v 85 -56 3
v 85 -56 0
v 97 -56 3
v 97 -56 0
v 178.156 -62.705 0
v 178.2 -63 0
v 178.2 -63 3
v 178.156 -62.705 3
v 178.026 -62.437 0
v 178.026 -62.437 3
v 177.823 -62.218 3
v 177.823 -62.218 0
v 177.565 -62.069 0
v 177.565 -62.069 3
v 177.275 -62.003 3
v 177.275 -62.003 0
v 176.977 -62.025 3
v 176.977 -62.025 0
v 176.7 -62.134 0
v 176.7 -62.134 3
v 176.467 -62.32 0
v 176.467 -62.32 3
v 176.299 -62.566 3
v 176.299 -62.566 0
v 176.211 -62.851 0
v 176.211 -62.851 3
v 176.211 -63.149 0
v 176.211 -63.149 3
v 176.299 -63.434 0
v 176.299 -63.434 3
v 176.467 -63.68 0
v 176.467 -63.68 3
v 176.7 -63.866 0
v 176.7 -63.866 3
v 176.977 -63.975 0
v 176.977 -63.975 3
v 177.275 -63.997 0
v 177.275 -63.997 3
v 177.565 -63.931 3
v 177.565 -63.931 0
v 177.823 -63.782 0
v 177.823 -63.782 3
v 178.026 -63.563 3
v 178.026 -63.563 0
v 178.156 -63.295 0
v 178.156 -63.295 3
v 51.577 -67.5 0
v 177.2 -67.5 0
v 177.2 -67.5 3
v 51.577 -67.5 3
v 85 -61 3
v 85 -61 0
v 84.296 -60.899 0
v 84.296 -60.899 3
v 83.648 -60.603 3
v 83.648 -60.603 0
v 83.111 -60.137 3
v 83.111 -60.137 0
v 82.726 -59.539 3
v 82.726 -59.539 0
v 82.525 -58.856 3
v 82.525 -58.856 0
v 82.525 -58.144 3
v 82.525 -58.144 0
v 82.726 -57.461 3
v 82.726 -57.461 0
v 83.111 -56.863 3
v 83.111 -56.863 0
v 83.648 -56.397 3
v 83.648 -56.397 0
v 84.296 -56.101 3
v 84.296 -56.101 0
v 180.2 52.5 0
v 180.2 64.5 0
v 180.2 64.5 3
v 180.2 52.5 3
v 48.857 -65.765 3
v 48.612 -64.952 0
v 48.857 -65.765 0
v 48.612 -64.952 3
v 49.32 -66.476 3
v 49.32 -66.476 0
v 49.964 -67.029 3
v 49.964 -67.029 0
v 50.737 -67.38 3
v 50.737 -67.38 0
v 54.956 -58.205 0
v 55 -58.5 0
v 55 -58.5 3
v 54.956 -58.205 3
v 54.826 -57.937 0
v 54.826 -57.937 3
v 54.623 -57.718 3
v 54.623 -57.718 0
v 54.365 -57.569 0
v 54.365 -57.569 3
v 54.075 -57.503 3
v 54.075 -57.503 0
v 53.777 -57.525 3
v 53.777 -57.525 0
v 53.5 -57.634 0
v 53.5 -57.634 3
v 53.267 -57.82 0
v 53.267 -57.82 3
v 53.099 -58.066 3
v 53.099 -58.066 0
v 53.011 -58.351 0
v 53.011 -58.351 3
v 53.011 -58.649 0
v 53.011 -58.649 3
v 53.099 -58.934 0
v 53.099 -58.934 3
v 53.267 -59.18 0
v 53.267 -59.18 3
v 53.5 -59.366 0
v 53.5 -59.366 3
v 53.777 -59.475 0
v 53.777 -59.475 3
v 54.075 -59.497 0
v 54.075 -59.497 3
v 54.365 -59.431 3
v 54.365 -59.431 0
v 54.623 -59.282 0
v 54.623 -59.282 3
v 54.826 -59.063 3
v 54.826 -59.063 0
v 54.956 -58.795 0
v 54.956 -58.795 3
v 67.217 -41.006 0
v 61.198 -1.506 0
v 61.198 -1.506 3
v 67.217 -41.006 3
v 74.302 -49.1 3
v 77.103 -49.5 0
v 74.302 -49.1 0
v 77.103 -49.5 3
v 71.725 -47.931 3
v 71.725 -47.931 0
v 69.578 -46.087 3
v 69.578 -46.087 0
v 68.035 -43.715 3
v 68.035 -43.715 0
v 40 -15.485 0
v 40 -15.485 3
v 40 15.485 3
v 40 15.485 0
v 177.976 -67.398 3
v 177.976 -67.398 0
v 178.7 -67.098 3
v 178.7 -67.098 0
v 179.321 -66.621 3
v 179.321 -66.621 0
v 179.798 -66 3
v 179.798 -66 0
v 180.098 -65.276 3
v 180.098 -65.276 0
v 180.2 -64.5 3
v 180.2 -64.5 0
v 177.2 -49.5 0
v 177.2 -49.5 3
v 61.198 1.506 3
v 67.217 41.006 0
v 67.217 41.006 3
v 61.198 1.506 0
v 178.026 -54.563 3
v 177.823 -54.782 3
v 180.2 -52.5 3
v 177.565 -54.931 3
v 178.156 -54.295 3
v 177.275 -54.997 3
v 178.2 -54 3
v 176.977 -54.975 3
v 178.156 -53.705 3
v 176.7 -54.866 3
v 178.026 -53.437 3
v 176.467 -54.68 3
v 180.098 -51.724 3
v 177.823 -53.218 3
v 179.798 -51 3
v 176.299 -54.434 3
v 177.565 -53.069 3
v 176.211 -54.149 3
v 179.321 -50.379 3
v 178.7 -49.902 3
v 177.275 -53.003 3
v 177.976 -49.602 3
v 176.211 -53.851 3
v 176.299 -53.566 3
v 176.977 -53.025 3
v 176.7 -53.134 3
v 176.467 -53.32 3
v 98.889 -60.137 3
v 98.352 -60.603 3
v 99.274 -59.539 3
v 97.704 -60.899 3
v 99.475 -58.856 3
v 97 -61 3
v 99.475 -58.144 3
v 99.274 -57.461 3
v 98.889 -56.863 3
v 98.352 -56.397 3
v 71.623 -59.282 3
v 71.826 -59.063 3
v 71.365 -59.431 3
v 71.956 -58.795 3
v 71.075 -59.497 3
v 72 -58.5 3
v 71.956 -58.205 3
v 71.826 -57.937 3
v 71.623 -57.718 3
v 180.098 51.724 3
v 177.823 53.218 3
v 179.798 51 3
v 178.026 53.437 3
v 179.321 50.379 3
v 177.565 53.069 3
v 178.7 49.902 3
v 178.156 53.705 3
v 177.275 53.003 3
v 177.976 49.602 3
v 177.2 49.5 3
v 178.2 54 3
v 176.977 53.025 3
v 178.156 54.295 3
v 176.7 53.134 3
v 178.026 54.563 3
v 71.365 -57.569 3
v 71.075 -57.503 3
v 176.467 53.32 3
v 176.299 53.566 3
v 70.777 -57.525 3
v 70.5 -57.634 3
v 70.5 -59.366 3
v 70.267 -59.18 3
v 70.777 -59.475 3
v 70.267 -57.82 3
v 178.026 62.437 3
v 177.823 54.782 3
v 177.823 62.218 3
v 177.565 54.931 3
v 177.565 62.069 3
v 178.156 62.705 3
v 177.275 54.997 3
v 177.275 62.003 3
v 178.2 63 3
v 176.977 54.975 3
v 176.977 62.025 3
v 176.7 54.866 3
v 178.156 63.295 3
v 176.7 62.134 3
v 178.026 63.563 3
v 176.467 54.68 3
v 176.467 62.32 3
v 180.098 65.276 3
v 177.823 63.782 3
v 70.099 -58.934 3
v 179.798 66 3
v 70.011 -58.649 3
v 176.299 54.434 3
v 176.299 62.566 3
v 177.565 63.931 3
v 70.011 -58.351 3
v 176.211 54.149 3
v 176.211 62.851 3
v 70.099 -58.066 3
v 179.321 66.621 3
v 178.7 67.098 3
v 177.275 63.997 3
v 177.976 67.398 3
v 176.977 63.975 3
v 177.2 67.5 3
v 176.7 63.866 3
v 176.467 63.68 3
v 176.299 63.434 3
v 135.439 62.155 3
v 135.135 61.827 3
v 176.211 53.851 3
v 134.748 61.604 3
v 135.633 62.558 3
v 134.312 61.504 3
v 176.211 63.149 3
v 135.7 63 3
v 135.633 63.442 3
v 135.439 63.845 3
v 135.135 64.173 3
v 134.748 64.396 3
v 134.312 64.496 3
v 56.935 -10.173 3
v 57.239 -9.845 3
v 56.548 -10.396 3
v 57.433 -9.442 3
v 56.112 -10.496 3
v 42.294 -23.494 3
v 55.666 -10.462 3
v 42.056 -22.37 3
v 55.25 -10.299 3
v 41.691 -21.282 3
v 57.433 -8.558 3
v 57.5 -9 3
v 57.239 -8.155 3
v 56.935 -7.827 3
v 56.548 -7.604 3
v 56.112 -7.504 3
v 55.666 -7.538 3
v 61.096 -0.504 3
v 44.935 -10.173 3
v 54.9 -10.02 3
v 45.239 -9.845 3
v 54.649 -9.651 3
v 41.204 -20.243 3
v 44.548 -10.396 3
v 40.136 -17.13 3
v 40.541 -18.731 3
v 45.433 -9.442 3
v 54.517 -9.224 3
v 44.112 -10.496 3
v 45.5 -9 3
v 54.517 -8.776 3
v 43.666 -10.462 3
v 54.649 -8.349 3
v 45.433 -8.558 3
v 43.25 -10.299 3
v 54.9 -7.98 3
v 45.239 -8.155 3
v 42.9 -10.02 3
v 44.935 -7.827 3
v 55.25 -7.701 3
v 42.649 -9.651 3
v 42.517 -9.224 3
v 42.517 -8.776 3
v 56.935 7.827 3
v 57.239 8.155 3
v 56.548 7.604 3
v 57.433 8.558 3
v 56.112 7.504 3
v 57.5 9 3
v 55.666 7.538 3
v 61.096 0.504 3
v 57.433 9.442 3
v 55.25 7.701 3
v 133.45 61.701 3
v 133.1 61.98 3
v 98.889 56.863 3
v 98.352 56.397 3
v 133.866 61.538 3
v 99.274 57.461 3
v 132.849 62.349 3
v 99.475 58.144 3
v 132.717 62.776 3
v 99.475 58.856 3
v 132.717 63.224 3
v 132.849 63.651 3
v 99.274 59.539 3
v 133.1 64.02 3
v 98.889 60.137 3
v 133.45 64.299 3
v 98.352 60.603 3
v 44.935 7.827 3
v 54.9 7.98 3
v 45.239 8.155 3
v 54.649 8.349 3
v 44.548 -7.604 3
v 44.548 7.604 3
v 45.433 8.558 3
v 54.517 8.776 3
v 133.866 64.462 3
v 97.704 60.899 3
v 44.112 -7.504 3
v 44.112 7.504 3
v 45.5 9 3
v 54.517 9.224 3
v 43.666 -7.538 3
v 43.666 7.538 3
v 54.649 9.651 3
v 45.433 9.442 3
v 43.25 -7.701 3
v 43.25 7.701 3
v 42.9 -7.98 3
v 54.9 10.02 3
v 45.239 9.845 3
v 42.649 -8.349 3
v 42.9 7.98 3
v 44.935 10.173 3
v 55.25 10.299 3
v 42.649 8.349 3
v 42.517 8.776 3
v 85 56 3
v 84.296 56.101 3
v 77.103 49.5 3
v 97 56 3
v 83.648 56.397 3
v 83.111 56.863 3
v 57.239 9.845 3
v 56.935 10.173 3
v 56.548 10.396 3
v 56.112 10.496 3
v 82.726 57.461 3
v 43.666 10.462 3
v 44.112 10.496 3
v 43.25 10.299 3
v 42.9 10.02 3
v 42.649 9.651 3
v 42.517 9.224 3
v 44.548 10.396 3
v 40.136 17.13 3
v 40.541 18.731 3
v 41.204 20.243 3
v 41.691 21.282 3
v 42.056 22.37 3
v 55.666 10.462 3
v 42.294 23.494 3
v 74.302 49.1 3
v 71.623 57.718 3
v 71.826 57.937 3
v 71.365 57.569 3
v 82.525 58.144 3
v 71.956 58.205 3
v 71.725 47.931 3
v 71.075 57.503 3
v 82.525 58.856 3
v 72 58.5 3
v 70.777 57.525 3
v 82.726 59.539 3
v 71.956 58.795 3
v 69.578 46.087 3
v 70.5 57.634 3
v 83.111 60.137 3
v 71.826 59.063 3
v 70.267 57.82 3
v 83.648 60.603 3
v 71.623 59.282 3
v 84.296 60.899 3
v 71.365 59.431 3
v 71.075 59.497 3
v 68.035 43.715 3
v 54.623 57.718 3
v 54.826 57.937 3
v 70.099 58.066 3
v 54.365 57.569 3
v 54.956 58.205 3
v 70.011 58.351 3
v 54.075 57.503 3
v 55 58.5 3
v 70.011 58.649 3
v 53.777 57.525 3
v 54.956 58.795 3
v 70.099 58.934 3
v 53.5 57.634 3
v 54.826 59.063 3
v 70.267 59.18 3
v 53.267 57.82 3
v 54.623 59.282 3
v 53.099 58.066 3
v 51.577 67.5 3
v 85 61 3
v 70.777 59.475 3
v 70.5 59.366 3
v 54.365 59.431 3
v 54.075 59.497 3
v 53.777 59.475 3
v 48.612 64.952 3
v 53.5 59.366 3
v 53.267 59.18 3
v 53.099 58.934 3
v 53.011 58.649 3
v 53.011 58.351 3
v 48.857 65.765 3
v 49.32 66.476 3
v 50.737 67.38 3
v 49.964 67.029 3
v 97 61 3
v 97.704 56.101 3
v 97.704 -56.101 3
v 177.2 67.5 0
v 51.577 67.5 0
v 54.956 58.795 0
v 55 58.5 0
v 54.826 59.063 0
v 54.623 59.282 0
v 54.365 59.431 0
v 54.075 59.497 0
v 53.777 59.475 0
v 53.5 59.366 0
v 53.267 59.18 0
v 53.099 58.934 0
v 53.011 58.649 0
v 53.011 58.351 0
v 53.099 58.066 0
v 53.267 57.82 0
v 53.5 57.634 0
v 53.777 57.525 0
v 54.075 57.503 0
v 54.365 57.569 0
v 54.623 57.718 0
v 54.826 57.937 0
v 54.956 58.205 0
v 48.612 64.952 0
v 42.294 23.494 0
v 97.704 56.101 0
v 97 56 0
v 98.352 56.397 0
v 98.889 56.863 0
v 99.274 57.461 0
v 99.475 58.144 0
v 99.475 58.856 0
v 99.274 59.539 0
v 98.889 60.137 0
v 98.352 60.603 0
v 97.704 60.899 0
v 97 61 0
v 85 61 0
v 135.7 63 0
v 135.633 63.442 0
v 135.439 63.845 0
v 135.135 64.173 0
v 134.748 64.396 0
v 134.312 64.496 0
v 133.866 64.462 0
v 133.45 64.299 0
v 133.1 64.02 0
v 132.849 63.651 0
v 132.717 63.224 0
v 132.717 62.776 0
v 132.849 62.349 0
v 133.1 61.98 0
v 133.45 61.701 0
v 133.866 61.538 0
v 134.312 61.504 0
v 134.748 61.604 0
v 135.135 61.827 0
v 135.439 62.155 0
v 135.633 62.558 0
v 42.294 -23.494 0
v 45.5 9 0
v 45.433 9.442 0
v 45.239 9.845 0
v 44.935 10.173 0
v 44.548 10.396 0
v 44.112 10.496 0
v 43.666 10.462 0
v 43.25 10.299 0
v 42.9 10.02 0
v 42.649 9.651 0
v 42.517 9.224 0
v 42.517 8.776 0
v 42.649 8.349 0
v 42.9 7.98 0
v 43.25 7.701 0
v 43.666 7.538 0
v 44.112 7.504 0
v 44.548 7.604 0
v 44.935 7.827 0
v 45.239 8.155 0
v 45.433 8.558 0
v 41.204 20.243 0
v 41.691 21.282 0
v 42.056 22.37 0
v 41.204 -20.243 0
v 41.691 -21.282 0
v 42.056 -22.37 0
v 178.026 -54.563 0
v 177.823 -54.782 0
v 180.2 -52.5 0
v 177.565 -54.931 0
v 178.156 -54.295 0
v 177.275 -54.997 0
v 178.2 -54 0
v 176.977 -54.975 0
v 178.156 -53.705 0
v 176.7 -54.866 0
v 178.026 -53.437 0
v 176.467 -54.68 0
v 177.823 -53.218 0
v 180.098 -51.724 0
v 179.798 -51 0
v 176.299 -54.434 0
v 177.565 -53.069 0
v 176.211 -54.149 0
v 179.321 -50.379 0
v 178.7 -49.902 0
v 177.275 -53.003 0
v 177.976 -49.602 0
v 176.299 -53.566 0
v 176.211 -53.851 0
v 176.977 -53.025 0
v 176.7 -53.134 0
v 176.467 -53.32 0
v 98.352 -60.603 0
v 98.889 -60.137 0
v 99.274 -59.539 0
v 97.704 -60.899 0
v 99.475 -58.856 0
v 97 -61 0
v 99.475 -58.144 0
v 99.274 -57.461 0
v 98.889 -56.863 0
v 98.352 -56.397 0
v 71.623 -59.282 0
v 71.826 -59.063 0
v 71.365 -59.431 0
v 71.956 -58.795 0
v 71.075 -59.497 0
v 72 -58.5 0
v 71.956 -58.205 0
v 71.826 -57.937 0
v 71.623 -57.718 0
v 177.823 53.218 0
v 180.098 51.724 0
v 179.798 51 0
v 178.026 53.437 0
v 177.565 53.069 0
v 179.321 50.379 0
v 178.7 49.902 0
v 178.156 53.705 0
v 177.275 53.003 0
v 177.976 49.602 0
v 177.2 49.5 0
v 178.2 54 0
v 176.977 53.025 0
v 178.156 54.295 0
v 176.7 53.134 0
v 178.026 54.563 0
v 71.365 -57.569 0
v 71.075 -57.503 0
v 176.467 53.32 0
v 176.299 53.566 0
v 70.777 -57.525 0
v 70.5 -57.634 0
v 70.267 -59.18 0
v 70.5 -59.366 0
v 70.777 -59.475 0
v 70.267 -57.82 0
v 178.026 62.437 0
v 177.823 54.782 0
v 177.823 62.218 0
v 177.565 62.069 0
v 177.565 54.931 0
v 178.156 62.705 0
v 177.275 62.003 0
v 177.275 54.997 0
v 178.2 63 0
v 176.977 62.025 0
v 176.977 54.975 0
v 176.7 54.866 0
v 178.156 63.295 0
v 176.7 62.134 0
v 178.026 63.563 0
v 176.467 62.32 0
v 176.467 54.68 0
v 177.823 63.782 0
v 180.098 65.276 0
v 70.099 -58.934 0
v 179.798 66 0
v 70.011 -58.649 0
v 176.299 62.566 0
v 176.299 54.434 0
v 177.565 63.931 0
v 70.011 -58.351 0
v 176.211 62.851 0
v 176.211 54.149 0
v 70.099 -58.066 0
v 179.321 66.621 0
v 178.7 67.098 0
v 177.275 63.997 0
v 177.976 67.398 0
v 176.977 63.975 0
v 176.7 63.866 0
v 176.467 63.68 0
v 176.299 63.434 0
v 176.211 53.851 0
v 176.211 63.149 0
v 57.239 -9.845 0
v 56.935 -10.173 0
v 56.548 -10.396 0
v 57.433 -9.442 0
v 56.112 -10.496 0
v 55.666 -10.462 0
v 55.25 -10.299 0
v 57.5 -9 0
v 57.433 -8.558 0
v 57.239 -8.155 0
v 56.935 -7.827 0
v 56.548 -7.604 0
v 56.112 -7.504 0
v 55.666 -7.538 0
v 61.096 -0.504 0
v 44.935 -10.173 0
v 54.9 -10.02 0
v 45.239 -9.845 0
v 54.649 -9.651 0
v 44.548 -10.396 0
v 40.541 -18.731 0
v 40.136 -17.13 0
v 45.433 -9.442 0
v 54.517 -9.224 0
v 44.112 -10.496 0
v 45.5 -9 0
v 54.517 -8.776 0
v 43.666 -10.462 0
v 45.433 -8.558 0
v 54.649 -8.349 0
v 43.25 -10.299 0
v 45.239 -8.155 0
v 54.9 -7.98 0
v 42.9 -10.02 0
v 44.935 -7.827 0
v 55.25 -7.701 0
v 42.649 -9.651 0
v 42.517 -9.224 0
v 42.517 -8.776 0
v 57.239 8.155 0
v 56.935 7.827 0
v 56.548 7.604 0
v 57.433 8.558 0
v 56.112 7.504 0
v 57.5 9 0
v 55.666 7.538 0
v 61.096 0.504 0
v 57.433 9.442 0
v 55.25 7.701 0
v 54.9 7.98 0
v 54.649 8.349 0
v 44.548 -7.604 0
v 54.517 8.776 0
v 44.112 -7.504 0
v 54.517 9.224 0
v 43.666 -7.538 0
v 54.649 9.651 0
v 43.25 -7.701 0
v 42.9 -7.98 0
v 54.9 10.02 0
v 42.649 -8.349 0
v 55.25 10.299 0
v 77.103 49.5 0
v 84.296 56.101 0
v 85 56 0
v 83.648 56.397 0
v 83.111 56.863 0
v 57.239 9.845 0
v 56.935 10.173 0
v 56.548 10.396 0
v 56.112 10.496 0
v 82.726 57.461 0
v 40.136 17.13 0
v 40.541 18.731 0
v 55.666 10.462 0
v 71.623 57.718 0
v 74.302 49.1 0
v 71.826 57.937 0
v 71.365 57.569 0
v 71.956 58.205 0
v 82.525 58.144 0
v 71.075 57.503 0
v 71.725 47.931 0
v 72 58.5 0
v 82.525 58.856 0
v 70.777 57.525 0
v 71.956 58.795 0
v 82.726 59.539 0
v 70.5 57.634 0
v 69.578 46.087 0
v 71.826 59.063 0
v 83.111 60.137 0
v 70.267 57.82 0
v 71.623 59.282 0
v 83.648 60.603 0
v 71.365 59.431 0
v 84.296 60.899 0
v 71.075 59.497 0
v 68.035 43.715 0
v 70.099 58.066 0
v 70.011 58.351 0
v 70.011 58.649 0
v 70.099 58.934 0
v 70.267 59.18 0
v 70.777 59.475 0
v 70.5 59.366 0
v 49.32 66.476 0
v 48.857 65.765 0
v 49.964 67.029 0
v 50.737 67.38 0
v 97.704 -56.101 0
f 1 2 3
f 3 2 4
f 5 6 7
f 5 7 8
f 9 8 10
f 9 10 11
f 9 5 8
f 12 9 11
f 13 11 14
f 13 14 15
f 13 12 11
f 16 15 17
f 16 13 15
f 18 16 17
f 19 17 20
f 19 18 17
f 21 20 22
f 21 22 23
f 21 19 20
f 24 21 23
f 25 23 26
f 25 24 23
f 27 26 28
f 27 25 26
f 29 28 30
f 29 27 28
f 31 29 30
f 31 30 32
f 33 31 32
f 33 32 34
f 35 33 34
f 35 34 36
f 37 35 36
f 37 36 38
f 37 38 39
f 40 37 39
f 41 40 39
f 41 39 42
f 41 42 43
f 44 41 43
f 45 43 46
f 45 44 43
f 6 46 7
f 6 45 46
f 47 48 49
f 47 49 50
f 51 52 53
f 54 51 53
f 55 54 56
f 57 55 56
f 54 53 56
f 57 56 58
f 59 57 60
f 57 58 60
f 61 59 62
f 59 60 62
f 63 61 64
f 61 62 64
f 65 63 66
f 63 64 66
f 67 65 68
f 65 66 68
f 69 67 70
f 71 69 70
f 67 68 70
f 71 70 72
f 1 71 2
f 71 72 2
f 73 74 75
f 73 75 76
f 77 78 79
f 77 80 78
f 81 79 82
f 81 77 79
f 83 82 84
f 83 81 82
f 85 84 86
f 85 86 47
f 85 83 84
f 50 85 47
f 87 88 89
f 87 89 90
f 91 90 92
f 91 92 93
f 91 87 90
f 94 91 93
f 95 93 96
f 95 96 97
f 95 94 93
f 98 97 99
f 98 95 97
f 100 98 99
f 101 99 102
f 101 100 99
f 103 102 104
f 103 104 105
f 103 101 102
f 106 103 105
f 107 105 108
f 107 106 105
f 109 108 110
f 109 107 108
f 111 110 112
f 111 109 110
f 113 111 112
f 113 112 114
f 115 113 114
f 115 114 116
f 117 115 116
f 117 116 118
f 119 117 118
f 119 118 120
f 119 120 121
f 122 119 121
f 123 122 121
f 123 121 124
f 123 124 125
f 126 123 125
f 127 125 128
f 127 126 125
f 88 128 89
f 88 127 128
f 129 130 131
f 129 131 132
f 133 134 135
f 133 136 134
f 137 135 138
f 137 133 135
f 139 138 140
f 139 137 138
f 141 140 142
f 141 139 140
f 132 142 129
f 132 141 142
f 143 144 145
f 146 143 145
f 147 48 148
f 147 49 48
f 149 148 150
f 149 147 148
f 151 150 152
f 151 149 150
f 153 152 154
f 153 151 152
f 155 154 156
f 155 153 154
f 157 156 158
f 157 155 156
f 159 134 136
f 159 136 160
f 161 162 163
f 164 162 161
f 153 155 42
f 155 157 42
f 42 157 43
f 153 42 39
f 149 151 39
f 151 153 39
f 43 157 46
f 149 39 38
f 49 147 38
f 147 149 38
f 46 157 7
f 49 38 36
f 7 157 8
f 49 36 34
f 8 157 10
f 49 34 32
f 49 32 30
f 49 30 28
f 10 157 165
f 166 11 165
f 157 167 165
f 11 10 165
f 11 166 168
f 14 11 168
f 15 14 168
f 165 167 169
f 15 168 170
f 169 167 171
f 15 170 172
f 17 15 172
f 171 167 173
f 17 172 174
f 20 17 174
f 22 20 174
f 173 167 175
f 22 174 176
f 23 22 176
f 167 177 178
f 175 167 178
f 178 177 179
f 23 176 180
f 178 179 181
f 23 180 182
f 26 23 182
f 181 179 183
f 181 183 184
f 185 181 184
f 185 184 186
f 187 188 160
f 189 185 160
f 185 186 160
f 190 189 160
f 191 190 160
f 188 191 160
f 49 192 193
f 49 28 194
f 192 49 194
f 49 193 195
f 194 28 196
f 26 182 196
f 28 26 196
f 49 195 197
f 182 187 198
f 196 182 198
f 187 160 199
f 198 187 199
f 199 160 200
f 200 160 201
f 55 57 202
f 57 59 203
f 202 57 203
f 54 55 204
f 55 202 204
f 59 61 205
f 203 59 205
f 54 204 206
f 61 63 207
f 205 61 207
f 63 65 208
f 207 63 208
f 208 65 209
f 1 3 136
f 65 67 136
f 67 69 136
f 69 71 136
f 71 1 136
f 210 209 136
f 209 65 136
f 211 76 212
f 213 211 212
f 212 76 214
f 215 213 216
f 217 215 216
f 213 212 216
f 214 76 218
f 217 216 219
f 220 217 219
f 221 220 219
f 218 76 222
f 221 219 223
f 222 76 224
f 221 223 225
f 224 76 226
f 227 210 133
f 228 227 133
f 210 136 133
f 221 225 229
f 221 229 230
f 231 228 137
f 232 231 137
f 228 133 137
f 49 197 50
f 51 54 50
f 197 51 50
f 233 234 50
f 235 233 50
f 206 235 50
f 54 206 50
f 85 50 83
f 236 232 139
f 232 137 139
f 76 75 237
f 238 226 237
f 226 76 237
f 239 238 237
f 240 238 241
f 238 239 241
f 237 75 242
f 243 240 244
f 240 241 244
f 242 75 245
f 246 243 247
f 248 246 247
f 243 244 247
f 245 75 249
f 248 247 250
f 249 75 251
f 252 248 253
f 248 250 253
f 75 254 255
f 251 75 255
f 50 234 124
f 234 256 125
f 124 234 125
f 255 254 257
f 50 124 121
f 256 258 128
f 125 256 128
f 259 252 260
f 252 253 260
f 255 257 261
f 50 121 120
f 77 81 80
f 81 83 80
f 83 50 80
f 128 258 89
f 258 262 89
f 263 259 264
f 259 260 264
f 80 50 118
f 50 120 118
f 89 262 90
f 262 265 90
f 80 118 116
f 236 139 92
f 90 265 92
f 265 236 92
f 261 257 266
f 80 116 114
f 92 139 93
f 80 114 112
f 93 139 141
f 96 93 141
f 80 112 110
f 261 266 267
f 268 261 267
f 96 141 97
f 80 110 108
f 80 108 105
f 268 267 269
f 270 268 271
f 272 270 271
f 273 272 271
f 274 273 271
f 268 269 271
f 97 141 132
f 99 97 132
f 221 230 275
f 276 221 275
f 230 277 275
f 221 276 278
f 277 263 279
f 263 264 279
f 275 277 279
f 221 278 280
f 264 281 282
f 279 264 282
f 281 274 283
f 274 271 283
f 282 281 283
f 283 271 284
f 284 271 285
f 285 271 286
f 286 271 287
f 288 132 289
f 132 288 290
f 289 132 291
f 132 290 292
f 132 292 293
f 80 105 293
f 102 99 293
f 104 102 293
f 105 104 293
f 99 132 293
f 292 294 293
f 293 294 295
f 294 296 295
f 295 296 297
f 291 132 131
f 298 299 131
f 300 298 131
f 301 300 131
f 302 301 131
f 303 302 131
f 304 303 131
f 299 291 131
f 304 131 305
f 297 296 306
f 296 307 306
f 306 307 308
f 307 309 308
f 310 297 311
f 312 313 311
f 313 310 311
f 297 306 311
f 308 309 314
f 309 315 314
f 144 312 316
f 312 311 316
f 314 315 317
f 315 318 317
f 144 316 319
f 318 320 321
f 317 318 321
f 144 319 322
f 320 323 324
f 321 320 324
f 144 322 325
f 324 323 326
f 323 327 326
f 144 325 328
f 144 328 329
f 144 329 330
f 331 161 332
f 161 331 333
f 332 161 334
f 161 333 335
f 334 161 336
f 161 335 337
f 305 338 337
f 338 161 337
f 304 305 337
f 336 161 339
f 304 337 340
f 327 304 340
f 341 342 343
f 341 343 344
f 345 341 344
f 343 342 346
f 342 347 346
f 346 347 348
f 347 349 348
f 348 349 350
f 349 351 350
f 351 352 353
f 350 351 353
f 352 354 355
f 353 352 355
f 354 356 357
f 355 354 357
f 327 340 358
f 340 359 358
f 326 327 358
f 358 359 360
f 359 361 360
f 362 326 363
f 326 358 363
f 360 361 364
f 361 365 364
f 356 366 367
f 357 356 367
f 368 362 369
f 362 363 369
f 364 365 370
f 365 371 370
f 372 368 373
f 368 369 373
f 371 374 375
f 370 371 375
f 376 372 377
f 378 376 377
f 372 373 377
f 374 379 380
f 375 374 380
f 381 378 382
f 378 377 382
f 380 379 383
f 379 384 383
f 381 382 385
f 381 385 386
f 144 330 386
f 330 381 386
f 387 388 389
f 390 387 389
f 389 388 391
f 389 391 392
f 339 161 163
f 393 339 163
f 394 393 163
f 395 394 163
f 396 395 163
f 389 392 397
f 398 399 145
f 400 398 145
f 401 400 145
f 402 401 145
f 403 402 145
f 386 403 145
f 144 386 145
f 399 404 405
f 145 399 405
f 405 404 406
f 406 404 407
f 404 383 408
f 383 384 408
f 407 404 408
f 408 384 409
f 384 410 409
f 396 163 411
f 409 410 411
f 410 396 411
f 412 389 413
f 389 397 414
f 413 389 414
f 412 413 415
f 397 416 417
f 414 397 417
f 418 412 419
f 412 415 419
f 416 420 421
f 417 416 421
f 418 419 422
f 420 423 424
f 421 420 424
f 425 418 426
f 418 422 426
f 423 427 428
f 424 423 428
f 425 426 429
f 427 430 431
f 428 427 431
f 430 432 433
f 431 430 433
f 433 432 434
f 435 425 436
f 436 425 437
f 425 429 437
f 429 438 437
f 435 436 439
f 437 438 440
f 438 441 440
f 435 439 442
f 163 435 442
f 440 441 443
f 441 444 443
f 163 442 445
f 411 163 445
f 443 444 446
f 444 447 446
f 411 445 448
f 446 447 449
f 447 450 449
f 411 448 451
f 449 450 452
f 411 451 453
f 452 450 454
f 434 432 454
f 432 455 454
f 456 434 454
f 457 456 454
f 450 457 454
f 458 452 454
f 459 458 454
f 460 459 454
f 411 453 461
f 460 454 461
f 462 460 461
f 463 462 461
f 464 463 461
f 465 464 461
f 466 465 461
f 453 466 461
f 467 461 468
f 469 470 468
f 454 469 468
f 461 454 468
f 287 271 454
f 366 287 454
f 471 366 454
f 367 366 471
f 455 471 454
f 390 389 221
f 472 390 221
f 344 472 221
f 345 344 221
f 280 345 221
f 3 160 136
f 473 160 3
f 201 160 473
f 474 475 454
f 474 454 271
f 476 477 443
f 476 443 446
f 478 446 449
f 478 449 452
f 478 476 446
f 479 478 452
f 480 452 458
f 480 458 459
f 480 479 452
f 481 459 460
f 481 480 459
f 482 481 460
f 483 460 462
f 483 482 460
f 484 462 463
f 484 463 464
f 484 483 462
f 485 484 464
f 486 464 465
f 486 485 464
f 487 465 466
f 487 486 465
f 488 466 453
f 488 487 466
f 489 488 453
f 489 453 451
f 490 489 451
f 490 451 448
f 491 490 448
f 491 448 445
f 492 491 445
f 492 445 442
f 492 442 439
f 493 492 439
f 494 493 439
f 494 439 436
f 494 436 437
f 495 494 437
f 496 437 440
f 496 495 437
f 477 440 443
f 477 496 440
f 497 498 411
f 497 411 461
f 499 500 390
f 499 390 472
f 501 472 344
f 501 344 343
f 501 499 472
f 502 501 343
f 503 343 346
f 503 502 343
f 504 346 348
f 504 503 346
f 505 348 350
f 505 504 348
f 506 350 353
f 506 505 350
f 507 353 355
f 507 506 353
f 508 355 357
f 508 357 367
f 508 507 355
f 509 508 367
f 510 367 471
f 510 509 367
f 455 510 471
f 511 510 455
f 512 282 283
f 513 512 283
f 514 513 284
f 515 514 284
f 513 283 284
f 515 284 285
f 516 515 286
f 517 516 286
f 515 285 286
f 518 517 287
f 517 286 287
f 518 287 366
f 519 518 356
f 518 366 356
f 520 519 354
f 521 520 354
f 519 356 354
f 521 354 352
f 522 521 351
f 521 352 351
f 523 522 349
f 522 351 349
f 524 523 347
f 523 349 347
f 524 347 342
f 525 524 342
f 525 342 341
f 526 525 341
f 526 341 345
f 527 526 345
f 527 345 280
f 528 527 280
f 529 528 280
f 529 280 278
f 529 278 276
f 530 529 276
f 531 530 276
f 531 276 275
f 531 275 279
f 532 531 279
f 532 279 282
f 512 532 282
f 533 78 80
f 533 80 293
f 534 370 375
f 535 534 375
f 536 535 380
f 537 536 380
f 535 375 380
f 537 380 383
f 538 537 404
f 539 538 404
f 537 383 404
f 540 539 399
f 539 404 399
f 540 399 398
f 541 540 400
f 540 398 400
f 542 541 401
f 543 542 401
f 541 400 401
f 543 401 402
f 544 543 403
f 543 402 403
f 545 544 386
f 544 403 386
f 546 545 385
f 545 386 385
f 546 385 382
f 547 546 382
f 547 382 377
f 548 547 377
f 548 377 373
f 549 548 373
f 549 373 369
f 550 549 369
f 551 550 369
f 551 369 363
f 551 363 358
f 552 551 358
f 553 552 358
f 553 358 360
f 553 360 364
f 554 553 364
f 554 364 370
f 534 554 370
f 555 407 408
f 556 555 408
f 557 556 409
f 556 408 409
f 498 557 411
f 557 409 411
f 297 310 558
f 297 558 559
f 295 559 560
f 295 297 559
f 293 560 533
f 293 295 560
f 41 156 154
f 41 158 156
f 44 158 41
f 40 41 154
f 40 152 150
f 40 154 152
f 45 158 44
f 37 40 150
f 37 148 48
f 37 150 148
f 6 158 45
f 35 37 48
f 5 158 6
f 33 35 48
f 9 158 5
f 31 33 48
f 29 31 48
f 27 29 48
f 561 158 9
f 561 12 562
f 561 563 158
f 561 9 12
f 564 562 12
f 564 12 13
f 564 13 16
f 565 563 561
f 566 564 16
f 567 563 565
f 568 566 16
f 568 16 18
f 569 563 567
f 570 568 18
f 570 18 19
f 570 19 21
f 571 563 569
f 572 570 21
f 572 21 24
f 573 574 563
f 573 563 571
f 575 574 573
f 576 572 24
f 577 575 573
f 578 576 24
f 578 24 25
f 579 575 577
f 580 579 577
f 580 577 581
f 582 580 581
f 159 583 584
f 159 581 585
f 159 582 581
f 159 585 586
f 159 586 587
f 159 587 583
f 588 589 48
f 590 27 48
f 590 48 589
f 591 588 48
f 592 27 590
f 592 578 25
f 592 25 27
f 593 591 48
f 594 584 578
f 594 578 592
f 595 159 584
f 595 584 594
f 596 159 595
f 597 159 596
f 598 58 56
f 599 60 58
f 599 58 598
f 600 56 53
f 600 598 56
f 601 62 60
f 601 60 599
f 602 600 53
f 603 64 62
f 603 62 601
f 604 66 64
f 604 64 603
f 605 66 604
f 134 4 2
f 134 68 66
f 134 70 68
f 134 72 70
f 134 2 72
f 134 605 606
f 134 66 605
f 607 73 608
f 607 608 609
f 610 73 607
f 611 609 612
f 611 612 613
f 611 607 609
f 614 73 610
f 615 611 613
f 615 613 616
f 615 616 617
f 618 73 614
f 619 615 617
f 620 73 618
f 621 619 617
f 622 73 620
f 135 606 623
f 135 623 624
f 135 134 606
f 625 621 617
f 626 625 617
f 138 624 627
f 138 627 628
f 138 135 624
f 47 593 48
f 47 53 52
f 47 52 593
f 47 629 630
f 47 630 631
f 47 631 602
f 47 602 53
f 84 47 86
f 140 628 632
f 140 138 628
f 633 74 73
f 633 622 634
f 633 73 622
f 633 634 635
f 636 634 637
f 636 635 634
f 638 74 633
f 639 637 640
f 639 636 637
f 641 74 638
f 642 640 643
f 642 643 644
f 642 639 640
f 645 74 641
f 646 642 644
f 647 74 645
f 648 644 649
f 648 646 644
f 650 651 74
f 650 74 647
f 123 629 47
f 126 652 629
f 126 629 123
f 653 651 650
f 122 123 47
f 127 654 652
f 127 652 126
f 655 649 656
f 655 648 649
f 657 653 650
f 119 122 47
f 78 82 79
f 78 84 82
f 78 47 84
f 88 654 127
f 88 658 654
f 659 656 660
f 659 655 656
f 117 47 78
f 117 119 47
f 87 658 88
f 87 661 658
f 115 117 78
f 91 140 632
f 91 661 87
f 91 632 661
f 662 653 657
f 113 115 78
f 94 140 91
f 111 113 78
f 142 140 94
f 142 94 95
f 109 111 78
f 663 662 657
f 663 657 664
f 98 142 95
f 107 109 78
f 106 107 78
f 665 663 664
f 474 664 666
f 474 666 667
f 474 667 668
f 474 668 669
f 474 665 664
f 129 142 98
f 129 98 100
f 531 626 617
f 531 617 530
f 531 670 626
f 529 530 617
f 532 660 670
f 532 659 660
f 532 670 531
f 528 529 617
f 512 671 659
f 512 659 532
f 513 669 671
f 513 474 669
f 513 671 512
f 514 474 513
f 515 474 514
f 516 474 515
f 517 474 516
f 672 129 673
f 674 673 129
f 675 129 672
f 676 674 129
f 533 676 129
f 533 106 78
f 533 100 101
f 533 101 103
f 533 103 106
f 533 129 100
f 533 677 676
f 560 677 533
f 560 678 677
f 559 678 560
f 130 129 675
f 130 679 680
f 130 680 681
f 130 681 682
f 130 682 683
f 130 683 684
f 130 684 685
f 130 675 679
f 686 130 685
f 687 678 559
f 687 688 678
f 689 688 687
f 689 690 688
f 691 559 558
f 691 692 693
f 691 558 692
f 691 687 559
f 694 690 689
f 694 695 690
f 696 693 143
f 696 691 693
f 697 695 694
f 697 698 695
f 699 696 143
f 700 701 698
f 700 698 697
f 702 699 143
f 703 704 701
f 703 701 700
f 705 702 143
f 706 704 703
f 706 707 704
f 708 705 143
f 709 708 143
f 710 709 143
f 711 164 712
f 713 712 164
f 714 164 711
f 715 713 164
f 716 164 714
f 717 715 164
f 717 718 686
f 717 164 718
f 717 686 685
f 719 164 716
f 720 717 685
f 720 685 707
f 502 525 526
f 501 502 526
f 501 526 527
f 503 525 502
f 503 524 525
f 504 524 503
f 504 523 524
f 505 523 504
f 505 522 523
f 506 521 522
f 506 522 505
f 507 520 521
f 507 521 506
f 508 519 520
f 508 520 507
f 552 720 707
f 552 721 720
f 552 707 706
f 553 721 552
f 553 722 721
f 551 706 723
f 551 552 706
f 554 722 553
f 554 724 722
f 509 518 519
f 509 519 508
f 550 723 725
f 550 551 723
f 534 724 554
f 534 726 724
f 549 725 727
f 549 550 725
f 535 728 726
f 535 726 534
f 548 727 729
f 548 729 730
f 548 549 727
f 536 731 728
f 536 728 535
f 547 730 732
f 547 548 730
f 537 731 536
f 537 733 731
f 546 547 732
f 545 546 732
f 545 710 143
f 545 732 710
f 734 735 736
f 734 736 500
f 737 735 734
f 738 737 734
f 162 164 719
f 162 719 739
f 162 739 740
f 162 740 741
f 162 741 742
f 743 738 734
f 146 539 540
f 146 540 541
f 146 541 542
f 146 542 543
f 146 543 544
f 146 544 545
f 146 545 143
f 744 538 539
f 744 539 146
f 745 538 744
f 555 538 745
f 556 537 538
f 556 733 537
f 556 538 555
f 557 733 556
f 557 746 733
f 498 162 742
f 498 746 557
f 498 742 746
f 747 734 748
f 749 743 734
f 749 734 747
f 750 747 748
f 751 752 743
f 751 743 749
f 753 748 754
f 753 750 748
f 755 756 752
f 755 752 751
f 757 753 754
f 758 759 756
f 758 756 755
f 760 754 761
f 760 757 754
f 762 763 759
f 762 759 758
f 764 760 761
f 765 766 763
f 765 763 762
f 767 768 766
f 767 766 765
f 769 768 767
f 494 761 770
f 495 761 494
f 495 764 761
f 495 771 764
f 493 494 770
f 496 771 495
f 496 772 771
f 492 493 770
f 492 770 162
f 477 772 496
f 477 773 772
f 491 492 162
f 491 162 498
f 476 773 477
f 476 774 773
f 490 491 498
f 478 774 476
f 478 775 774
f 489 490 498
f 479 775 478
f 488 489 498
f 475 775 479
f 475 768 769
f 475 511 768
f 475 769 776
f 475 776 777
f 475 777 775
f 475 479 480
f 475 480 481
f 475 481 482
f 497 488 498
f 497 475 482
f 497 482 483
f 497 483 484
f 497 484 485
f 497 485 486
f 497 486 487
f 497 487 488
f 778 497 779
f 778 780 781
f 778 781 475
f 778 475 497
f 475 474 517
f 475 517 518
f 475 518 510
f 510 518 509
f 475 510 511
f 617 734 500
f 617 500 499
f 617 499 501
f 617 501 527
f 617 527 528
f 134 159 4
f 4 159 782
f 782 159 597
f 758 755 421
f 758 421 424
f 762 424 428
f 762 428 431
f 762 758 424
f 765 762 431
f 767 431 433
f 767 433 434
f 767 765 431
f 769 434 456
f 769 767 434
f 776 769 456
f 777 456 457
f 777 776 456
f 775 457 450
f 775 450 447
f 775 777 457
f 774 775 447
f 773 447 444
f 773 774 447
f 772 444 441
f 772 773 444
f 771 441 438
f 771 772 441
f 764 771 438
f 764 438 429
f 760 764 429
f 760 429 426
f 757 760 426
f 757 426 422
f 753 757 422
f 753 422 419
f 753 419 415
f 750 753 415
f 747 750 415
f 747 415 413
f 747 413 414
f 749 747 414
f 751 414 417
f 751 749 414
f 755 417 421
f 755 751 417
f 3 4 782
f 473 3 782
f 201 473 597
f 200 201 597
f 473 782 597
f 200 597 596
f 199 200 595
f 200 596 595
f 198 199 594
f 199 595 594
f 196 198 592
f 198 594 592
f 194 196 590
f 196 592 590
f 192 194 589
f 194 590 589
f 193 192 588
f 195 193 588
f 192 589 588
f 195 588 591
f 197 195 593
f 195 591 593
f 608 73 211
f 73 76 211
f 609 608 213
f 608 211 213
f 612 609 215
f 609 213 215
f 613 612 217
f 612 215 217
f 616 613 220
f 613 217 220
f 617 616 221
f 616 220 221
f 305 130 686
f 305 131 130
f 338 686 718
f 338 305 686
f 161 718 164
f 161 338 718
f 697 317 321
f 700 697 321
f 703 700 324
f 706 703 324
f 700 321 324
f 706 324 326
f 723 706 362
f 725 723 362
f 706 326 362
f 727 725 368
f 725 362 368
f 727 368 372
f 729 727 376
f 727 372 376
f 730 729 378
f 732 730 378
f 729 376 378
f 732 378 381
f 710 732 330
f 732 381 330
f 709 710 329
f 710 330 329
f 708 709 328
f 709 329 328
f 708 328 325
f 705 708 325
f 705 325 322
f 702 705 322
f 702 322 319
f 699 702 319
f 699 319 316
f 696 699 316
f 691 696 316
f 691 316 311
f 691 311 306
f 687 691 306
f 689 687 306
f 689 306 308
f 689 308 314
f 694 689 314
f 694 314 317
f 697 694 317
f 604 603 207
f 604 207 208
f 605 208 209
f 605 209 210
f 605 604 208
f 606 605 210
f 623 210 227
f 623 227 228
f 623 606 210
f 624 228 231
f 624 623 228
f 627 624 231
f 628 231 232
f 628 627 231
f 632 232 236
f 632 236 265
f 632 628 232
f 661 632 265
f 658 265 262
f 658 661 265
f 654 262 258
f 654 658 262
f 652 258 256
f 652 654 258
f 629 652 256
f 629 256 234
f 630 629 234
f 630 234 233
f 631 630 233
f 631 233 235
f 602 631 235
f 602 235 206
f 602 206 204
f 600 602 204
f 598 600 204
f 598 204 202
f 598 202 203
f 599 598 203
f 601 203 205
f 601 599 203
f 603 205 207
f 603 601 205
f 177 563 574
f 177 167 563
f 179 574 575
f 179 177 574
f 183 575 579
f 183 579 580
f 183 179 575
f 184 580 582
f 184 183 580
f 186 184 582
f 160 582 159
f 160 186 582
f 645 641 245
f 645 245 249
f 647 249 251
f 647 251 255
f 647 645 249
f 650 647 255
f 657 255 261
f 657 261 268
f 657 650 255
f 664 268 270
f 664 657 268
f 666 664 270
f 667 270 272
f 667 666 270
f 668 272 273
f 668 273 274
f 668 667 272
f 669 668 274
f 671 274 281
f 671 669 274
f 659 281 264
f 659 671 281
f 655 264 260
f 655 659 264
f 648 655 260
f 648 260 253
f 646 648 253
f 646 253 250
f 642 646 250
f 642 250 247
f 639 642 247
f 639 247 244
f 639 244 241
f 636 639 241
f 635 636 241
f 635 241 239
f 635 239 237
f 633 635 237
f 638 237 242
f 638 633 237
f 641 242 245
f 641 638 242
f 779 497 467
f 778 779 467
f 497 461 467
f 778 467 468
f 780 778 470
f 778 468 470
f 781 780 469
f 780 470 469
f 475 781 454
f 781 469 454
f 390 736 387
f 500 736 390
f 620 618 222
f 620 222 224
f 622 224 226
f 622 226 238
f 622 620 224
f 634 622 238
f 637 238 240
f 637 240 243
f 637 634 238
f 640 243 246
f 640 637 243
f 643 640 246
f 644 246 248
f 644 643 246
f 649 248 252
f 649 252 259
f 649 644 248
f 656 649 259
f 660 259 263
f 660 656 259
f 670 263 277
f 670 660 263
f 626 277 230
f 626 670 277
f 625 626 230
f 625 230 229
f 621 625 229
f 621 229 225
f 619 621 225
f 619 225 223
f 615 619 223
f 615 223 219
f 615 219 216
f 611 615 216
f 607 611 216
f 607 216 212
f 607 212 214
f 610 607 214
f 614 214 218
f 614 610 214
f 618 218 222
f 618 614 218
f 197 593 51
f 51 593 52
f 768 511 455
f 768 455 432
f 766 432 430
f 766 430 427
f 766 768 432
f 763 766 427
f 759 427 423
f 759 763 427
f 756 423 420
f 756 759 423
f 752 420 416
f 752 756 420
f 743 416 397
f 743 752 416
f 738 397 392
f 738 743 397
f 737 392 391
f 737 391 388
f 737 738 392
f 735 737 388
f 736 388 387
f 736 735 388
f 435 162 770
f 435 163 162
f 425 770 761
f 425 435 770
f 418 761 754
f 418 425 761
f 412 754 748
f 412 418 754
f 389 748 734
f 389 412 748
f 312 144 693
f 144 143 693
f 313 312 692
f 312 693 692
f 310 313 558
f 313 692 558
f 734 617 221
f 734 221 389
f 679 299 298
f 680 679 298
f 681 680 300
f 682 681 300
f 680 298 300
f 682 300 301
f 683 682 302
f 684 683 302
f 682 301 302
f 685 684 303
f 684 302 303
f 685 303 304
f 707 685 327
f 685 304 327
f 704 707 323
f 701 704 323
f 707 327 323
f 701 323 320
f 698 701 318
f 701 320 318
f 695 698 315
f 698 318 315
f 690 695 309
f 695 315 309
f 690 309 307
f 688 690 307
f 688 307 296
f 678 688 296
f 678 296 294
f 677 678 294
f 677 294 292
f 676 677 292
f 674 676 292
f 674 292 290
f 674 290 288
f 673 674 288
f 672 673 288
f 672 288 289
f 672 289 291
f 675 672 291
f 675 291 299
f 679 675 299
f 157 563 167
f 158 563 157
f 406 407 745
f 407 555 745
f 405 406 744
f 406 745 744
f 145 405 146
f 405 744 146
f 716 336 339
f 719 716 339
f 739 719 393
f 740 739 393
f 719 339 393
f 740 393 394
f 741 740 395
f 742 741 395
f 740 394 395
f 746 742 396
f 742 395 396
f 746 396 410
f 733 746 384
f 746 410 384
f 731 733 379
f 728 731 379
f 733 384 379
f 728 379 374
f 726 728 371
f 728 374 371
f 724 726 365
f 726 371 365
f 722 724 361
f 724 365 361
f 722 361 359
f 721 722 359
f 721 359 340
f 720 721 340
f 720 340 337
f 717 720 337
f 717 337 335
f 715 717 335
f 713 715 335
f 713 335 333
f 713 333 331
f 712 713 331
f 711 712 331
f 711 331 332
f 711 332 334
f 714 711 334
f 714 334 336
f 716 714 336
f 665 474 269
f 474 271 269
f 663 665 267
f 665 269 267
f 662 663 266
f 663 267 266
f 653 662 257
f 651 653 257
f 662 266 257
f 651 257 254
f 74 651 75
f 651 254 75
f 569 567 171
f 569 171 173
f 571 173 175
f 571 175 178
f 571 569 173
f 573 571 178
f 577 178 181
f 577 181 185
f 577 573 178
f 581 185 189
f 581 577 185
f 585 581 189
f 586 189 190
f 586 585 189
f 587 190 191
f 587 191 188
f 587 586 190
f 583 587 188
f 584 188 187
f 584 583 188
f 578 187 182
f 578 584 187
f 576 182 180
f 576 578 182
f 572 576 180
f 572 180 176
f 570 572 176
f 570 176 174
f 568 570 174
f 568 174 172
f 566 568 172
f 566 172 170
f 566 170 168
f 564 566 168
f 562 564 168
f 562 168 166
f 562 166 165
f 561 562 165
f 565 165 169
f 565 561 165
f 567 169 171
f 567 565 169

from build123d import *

# Parameters (mm, degrees)
SKETCH_1_R          = 1
EXTRUDE_1_DEPTH     = 3
FILLET_1_R          = 10
FILLET_2_R          = 10
FILLET_3_R          = 5
FILLET_4_R          = 3
FILLET_5_R          = 10
SKETCH_5_R          = 1.5
CUT_EXTRUDE_2_DEPTH = 10
SKETCH_6_W          = 40
SKETCH_6_H          = 36.981974808
CUT_EXTRUDE_3_DEPTH = 10
FILLET_6_R          = 10
SKETCH_7_R          = 1.5
CUT_EXTRUDE_4_DEPTH = 31


with BuildPart() as part:
    # 草图1 → 凸台-拉伸1 (new body)
    with BuildSketch(Plane.XY):
        Polygon((0, 15), (0, -15), (41, -15), (49, -67.5), (180.2, -67.5), (180.2, -49.5), (68.511096619, -49.5), (60.968239476, 0), (68.511096619, 49.5), (180.2, 49.5), (180.2, 67.5), (49, 67.5), (41, 15), align=None)
        with Locations((54, -58.5)):
            Circle(SKETCH_1_R, mode=Mode.SUBTRACT)
        with Locations((71, -58.5)):
            Circle(SKETCH_1_R, mode=Mode.SUBTRACT)
        with BuildLine():
            ThreePointArc((85, -61), (82.5, -58.5), (85, -56))
            Line((85, -56), (97, -56))
            ThreePointArc((97, -56), (99.5, -58.5), (97, -61))
            Line((97, -61), (85, -61))
        make_face(mode=Mode.SUBTRACT)
        with Locations((177.2, -63)):
            Circle(SKETCH_1_R, mode=Mode.SUBTRACT)
        with Locations((177.2, -54)):
            Circle(SKETCH_1_R, mode=Mode.SUBTRACT)
        with Locations((54, 58.5)):
            Circle(SKETCH_1_R, mode=Mode.SUBTRACT)
        with Locations((71, 58.5)):
            Circle(SKETCH_1_R, mode=Mode.SUBTRACT)
        with BuildLine():
            Line((97, 56), (85, 56))
            ThreePointArc((85, 56), (82.5, 58.5), (85, 61))
            Line((85, 61), (97, 61))
            ThreePointArc((97, 61), (99.5, 58.5), (97, 56))
        make_face(mode=Mode.SUBTRACT)
        with Locations((177.2, 54)):
            Circle(SKETCH_1_R, mode=Mode.SUBTRACT)
        with Locations((177.2, 63)):
            Circle(SKETCH_1_R, mode=Mode.SUBTRACT)
    extrude(amount=EXTRUDE_1_DEPTH)

    # 圆角1
    fillet_1_edges = [part.edges().sort_by_distance(p)[0] for p in [
        (41, -15, 1.5),
        (41, 15, 1.5),
    ]]
    fillet(fillet_1_edges, radius=FILLET_1_R)

    # 圆角2
    fillet_2_edges = [part.edges().sort_by_distance(p)[0] for p in [
        (68.511096619, -49.5, 1.5),
        (68.511096619, 49.5, 1.5),
    ]]
    fillet(fillet_2_edges, radius=FILLET_2_R)

    # 圆角3
    fillet_3_edges = [part.edges().sort_by_distance(p)[0] for p in [
        (0, -15, 1.5),
        (0, 15, 1.5),
    ]]
    fillet(fillet_3_edges, radius=FILLET_3_R)

    # 圆角4
    fillet_4_edges = [part.edges().sort_by_distance(p)[0] for p in [
        (180.2, -67.5, 1.5),
        (180.2, -49.5, 1.5),
        (180.2, 49.5, 1.5),
        (180.2, 67.5, 1.5),
        (49, -67.5, 1.5),
        (49, 67.5, 1.5),
    ]]
    fillet(fillet_4_edges, radius=FILLET_4_R)

    # 圆角5
    fillet_5_edges = [part.edges().sort_by_distance(p)[0] for p in [
        (60.968239476, 0, 1.5),
    ]]
    fillet(fillet_5_edges, radius=FILLET_5_R)

    # 草图5 → 切除-拉伸2 (cut)
    with BuildSketch(Plane.XY.offset(3)):
        with Locations((134.2, 63)):
            Circle(SKETCH_5_R)
    extrude(amount=-CUT_EXTRUDE_2_DEPTH, mode=Mode.SUBTRACT)

    # 草图6 → 切除-拉伸3 (cut)
    with BuildSketch(Plane.XY.offset(3)):
        with Locations((20, 0)):
            Rectangle(SKETCH_6_W, SKETCH_6_H)
    extrude(amount=-CUT_EXTRUDE_3_DEPTH, mode=Mode.SUBTRACT)

    # 圆角6
    fillet_6_edges = [part.edges().sort_by_distance(p)[0] for p in [
        (40, -18.490987404, 1.5),
        (40, 18.490987404, 1.5),
    ]]
    fillet(fillet_6_edges, radius=FILLET_6_R)

    # 草图7 → 切除-拉伸4 (cut)
    with BuildSketch(Plane.XY.offset(3)):
        with Locations((44, 9)):
            Circle(SKETCH_7_R)
        with Locations((56, 9)):
            Circle(SKETCH_7_R)
        with Locations((44, -9)):
            Circle(SKETCH_7_R)
        with Locations((56, -9)):
            Circle(SKETCH_7_R)
    extrude(amount=-CUT_EXTRUDE_4_DEPTH, mode=Mode.SUBTRACT)


solid = part.part
